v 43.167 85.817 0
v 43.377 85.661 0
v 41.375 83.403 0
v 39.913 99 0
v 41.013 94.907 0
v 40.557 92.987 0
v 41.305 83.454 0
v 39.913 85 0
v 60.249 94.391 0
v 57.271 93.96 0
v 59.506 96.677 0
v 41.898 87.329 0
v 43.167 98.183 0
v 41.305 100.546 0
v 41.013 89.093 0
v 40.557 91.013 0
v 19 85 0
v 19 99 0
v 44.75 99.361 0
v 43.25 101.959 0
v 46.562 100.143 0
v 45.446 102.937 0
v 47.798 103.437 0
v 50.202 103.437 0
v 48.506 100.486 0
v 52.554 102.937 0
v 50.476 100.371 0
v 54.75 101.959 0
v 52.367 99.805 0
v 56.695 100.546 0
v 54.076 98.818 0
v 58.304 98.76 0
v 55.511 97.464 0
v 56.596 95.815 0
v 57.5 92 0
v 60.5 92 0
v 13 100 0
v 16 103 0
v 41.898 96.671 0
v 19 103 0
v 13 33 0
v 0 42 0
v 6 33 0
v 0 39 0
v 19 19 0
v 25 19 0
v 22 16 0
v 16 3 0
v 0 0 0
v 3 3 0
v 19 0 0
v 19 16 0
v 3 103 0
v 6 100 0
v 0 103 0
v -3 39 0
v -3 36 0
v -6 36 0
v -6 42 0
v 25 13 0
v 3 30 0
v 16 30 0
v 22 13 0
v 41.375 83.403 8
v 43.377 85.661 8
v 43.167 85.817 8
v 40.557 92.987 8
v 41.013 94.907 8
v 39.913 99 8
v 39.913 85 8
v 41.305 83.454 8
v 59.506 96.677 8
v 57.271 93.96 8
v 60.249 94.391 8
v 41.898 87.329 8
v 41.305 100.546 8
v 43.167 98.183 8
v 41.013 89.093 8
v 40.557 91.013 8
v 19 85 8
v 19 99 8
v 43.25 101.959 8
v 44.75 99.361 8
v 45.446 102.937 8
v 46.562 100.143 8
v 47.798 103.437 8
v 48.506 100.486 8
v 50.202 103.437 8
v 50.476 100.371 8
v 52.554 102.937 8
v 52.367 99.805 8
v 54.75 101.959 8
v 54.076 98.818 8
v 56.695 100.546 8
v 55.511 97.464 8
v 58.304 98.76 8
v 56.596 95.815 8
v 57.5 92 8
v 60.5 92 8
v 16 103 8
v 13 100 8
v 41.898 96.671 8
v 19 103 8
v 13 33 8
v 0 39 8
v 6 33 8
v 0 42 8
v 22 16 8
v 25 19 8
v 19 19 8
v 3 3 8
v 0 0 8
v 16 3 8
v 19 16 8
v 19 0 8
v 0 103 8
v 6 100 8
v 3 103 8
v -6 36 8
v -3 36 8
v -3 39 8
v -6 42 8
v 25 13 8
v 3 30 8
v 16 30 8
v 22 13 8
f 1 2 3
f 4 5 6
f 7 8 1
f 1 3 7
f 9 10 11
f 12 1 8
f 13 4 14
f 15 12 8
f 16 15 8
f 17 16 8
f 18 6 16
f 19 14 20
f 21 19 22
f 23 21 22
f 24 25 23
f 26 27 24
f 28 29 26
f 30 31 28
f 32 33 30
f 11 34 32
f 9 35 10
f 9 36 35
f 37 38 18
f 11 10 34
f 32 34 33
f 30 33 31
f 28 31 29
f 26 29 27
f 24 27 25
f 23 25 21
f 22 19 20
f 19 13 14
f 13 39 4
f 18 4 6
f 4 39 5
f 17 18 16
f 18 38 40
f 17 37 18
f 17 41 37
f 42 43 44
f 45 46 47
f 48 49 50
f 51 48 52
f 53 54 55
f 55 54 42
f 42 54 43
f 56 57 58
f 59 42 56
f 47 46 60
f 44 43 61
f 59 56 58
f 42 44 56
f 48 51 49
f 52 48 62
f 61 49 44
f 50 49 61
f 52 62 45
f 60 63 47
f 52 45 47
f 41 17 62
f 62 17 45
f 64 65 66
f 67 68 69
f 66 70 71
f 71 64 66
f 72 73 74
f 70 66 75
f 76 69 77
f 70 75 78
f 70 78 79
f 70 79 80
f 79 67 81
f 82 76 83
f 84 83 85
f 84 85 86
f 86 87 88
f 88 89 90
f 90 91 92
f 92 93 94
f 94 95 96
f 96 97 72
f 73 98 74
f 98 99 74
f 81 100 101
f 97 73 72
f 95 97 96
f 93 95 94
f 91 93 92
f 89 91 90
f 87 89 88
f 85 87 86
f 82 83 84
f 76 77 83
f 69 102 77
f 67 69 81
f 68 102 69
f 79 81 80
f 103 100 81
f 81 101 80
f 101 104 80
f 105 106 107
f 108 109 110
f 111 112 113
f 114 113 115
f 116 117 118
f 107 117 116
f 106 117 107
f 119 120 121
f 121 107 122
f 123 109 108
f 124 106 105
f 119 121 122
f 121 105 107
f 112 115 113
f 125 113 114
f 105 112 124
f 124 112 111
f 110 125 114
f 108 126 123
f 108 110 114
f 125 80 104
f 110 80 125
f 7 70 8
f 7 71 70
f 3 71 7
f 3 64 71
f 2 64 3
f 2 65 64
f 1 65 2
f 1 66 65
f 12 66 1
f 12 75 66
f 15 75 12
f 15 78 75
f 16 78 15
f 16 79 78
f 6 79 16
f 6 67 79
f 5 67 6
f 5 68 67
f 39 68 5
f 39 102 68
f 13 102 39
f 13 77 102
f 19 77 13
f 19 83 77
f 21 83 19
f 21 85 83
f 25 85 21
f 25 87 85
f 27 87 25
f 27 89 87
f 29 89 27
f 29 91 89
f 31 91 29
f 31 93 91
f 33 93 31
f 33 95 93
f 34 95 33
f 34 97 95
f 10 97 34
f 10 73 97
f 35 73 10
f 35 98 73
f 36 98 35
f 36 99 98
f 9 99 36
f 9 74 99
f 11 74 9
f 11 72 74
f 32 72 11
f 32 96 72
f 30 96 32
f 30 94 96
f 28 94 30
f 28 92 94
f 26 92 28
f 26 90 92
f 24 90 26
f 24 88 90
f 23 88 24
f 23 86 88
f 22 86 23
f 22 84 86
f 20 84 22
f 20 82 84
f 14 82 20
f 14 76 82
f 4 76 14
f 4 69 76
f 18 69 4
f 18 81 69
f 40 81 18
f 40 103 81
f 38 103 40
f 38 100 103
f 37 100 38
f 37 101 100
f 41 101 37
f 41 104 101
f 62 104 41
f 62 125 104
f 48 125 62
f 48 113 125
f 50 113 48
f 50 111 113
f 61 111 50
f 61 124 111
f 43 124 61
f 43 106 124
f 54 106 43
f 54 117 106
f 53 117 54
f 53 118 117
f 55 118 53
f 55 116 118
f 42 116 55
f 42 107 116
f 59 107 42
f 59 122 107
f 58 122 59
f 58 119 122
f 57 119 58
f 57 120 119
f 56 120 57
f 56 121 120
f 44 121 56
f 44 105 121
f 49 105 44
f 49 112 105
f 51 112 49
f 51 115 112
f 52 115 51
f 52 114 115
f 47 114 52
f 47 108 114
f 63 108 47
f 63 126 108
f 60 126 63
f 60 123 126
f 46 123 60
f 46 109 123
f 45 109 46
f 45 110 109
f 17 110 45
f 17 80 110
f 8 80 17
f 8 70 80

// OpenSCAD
// shower_brackets
// brackets to mount 'hexbox' over top of shower wall
// all measures are in mm

frame_width = 13;  // how wide the frame is accross the top
frame_height = 27; // how long the frame is where it covers the glass
                   // should include the silicone bead
frame_lip = 3;  // the distance between the glass and the outside of the frame
                // this will make the ends of the bracket this much thicker
                // set to 0 to ignore

bracket_thickness = 3;
bracket_width = 8;
bracket_internal_descent = 100;  // should be 60 in and 50 out
bracket_external_descent = 100;

total_width = frame_width + (2 * bracket_thickness);

dowell_hook_clearance = 8; // gap (mm) between top of dowell hook centre and bracket_external_descent

dowell_hook_descent = bracket_external_descent - dowell_hook_clearance; // how far down is the centre
dowell_hook_pad = [24,14];  // padding between the bracket and the hook. its a rectangle of [x,y]
dowell_hook_thickness = 3;
dowell_hook_diameter = 17; // the centre of the circle will be .5 * diameter from the outside edge of the pad
dowell_hook_extra_degrees = 5;

// registration-* > 0 makes a trianguler outdent to assist with lining up the basket (hexbox)

// registration-* are distances from the top of the frame, not the bracket
// they can be a scalar or a list. set to undef if you dont want any
//registration_internal = [9,15];  // should be about 25
//registration_external = 11;
registration_internal=undef;
registration_external=undef;

// instead of registering and gluing, how about a couple of hooks
// attachment top and bottom form two hooks where the bottom of att-top and
// the top of att-bottom is this far from the top of the bracket.  ie the difference between them should be the height of your basket
attachment_hook_internal = 36 ;
attachment_hook_external = 13;

//attachment_bottom_internal = 18 ;
//attachment_bottom_external = 18;

//constants for x and y directions
POS_X = 1;
NEG_X = -1;
POS_Y = 1;
NEG_Y = -1;

module dowell_rectangle(left, top, right, bottom) {
    polygon([[left, top], [right, top], [right, bottom], [left, bottom]]);
}

module dowell_pad() {
    radius = dowell_hook_diameter / 2;
    fudge_factor = -0.5;
    translate([dowell_hook_diameter + bracket_width + dowell_hook_pad[0], dowell_hook_descent, 0])
        dowell_rectangle(
            left   = -radius,
            top    = -dowell_hook_pad[1] / 2,
            right  = -(radius + dowell_hook_pad[0] + dowell_hook_thickness + fudge_factor),
            bottom = dowell_hook_pad[1] / 2
        );
}

module dowell_hook_circle() {
    radius = dowell_hook_diameter / 2;
    ring_outer_d = dowell_hook_diameter + (2 * dowell_hook_thickness);
    translate([dowell_hook_diameter + bracket_width + dowell_hook_pad[0], dowell_hook_descent, 0])
        difference() {
            circle(d = ring_outer_d);
            circle(d = dowell_hook_diameter);
            polygon([
                [0, 0],
                [-radius * 1.2, -(radius + dowell_hook_thickness)],
                [radius + dowell_hook_thickness, -(radius + dowell_hook_thickness)],
                [radius + dowell_hook_thickness, 0]
            ]);
        }
}

module bracket () {
    module registration (origin, opposite, adjacent) {
        // draws a right angle triangle at origin with sides of length opposite
        // and adjacent.
        translate(origin)
            polygon([[0,0],[opposite,adjacent],[0,adjacent]]);
    }

    module attachment_hook(origin, thickness, width, height, xdir, ydir) {
        // make a hook. drawing time:
        // drawing made from the perspective of the hook extending into negative x and positive y
        // origin     _    .   _
        //                    | |
        // y = inside _     __| |  (or, height - thickness)
        // y = height _    |____|
        //
        // x = width  .  .  .   |
        //
        // Note that noting is printed along origin(y) - this isthe material that the hook
        // extends from
        //
        // xdir and ydir should be either 1 or -1 to determine in what directions the hook extends
        // from origin. ie to get the drawing above, x=-1 and y=1

        //ydir = 1;
        //xdir = -1;
        // adjust our base dimensions for direction
        thicky = ydir*thickness;
        thickx = xdir*thickness;
        heighty = ydir*height;
        widthx = -xdir*width;

        // now derive the outer and internal (inner bottom) dimmensions
        bottom = heighty;
        left = widthx-thickx;
        internal = heighty-thicky;
        translate(origin)
            polygon([
                    [0,0],
                    [0,bottom],
                    [widthx,bottom],
                    [widthx,0],
                    [left,0],
                    [left,internal],
                    [0,internal]
            ]);


    }

    module dowell_hook() {
        dowell_hook_circle();
        dowell_pad();
    }

    linear_extrude(height = bracket_width) {

        //top
        square([ total_width, bracket_thickness], center = false);
        //insid
        square([ bracket_thickness, bracket_internal_descent+bracket_thickness], center=false);
        //outside
        translate([frame_width+( bracket_thickness),0,0])
            square([ bracket_thickness, bracket_external_descent+bracket_thickness], center=false);

        // frame_lip
        translate([bracket_thickness, frame_height+bracket_thickness,0])
            polygon([[0,0],[frame_lip,bracket_thickness],[frame_lip,bracket_internal_descent-frame_height-bracket_thickness],[0,bracket_internal_descent-frame_height]]);

        translate([frame_width + bracket_thickness, frame_height+bracket_thickness,0])
            polygon([[0,0],[-frame_lip,bracket_thickness],[-frame_lip,bracket_external_descent-frame_height-bracket_thickness],[0,bracket_external_descent-frame_height]]);

        // registration
        for(reg=registration_internal) {
            registration([0,reg,0], -bracket_thickness, bracket_thickness);
        }
        for(reg=registration_external) {
            registration([total_width,registration_external,0], bracket_thickness, bracket_thickness);
        }
        attachment_hook([0,attachment_hook_internal,0],bracket_thickness, -(bracket_thickness*2), (bracket_thickness*2),NEG_X, POS_Y);
        attachment_hook([total_width,attachment_hook_external,0],bracket_thickness, -(bracket_thickness*2), (bracket_thickness*2),POS_X, POS_Y);
        dowell_hook();
    }
}


bracket();
